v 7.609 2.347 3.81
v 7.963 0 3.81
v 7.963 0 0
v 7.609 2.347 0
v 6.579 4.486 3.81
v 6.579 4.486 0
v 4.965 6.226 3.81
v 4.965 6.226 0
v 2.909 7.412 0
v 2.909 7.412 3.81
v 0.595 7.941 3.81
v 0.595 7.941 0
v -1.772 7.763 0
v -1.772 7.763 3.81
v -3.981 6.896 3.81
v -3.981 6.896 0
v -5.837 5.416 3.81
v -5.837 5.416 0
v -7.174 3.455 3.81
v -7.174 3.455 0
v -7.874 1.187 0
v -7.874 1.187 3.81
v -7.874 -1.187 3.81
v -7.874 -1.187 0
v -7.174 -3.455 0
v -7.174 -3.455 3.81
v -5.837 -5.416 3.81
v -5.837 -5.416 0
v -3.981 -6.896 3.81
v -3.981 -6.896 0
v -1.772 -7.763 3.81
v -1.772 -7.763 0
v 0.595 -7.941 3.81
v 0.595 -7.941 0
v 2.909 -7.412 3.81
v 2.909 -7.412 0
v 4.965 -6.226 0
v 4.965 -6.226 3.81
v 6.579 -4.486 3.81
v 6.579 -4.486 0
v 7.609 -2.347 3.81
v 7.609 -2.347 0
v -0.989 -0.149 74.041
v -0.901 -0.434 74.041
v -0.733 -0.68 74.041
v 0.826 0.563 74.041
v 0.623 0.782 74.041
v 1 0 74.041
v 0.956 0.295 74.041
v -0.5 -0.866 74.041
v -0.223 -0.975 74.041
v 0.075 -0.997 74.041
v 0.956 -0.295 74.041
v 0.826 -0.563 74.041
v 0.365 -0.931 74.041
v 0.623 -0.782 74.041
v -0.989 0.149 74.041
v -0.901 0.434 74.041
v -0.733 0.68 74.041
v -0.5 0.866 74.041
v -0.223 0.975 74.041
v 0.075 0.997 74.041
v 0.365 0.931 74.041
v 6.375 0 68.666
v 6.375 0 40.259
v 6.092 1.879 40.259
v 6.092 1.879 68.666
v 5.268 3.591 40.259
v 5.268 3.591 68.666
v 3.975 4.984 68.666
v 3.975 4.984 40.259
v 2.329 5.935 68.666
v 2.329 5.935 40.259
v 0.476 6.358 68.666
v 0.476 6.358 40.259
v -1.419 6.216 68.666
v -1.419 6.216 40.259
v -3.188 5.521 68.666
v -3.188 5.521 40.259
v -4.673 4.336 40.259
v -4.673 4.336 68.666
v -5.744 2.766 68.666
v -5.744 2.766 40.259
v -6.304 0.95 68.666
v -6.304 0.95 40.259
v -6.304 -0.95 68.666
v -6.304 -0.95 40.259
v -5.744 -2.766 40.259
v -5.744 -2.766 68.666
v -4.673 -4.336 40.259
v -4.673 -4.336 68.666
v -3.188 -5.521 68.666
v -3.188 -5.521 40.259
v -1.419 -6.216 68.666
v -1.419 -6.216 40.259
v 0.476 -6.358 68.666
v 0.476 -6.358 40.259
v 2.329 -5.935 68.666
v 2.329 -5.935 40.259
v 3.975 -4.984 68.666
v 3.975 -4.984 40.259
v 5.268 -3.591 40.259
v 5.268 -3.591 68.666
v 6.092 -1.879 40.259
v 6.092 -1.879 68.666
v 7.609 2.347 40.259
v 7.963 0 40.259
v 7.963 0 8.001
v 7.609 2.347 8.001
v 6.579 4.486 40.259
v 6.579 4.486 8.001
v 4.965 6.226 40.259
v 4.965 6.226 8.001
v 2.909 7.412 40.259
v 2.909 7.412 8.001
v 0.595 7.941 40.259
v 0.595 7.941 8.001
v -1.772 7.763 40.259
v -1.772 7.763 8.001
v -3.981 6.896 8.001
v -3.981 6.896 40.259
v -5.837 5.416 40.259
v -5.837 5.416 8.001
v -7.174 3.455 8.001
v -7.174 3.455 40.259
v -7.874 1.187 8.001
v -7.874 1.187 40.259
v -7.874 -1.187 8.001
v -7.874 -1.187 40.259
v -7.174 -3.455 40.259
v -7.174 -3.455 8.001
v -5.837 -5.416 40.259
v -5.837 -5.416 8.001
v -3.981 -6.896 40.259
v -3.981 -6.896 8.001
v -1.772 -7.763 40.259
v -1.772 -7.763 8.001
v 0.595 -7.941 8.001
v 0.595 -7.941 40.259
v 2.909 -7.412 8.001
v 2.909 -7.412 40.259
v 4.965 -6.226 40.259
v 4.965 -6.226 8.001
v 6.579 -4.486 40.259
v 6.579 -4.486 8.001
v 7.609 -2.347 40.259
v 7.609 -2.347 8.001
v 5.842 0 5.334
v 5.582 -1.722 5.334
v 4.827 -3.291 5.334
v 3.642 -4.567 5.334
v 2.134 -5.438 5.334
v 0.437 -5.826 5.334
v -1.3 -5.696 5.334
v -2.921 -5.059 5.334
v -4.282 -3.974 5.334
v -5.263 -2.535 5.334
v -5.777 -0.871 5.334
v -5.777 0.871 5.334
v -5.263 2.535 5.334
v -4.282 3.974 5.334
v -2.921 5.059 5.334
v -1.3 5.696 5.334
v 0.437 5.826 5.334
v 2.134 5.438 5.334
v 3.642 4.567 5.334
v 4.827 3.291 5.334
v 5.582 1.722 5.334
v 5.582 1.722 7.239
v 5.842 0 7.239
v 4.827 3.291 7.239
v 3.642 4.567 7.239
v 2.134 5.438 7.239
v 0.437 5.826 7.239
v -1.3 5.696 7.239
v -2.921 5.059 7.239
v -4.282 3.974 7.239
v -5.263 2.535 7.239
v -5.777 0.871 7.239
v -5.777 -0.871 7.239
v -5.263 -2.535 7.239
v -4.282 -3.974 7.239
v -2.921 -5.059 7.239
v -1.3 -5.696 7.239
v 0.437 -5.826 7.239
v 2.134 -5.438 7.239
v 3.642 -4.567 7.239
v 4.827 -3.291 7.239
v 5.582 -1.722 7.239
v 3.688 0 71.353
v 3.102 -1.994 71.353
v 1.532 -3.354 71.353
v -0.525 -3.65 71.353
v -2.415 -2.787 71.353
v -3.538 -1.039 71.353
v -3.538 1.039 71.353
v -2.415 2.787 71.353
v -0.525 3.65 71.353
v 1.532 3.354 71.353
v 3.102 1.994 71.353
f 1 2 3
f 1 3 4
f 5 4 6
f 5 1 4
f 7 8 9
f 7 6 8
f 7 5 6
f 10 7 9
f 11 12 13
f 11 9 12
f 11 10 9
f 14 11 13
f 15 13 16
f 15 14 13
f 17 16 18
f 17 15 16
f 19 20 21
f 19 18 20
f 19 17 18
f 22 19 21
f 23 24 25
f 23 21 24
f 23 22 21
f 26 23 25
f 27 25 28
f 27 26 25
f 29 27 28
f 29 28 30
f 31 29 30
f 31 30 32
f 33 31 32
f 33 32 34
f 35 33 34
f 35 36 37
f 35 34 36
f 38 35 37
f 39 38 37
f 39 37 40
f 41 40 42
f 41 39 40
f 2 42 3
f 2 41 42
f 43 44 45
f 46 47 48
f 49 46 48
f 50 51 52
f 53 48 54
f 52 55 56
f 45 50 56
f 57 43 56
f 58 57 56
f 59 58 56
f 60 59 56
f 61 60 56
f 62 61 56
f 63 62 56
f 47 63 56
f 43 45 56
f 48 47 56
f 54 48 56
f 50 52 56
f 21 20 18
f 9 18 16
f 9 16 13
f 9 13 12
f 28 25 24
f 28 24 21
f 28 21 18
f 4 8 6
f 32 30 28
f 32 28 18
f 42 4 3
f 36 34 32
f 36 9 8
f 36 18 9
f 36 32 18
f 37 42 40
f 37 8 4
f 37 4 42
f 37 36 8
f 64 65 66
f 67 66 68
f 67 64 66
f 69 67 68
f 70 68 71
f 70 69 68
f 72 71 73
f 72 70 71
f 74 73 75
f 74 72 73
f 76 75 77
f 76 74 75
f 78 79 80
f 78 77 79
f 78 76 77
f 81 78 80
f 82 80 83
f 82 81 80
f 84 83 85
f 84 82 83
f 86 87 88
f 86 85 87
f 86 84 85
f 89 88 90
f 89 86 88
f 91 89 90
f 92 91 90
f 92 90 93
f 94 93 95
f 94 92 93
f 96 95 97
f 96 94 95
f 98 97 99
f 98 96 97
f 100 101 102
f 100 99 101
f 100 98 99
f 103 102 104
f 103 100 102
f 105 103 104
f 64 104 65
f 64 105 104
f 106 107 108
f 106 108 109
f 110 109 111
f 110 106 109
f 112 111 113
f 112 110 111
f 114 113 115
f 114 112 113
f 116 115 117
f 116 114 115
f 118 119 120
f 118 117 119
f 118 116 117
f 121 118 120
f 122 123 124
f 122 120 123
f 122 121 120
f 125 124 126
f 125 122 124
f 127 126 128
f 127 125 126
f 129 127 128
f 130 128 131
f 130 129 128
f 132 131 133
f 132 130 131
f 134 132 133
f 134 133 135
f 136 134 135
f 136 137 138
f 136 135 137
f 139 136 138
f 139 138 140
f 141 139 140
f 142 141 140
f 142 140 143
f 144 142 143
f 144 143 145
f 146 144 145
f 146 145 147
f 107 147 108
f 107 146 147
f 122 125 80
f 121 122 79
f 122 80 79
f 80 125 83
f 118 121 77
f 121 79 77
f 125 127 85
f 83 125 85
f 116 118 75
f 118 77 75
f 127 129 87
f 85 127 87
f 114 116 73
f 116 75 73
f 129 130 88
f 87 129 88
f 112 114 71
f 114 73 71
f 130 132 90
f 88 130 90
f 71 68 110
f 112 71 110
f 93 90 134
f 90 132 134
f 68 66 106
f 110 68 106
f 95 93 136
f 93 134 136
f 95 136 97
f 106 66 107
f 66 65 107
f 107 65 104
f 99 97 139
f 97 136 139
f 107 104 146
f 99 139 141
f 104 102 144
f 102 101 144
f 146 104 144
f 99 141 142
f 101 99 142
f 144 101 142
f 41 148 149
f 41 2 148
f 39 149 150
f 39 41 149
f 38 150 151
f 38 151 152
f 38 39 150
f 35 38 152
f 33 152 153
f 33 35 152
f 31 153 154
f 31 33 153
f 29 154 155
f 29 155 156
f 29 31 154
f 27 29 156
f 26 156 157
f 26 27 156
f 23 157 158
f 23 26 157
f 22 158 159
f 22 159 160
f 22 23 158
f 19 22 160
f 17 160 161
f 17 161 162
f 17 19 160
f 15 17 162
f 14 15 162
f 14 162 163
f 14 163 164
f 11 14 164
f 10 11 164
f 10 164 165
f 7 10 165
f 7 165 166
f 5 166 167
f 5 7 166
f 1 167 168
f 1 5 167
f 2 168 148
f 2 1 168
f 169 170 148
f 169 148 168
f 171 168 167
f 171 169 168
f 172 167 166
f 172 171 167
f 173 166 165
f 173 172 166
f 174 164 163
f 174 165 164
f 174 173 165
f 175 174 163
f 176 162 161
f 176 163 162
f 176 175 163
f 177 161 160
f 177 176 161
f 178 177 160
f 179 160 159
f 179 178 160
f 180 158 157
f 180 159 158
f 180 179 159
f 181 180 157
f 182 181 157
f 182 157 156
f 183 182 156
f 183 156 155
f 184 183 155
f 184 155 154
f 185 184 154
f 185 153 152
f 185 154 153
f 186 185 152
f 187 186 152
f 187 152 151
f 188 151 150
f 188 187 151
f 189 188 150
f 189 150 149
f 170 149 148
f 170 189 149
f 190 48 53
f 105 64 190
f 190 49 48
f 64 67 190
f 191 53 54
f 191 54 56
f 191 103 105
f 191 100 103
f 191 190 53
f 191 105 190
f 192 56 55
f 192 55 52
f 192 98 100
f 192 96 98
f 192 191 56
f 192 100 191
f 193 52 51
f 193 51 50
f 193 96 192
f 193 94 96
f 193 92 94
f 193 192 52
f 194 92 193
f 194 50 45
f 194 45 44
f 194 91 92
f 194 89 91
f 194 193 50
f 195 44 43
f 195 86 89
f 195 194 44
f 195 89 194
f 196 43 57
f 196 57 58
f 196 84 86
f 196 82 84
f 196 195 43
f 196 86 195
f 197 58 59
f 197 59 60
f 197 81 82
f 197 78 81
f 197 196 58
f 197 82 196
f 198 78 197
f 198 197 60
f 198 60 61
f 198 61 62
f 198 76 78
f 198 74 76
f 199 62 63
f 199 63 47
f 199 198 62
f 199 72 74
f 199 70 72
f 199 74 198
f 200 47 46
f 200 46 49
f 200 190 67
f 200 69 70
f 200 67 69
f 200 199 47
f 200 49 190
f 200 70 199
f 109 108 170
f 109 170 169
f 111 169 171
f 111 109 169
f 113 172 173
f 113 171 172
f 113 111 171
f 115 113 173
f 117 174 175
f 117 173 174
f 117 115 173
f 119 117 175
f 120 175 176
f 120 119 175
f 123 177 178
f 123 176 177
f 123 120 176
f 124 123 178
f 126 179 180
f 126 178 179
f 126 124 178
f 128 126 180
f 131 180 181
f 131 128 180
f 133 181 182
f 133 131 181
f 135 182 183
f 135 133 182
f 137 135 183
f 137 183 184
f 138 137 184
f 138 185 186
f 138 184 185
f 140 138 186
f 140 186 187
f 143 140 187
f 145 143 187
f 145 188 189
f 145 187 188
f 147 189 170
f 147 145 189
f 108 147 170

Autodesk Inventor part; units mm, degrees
ref_plane "YZ Plane" through (0, 0, 0) normal (1, 0, 0) x (0, 1, 0)
ref_plane "XZ Plane" through (0, 0, 0) normal (0, 1, 0) x (-1, 0, 0)
ref_plane "XY Plane" through (0, 0, 0) normal (0, 0, 1) x (1, 0, 0)
sketch "Sketch1" plane through (0, 0, 0) normal (0, 1, 0) x (-1, 0, 0)
  line L0 (0, 0) -> (-7.9629, 0)
  line L1 (-7.9629, 0) -> (-7.9629, 3.81)
  line L2 (-7.9629, 3.81) -> (-5.842, 5.334)
  line L3 (-5.842, 5.334) -> (-5.842, 7.239)
  line L4 (-5.842, 7.239) -> (-7.9629, 8.001)
  line L5 (-7.9629, 8.001) -> (-7.9629, 40.259)
  line L6 (-7.9629, 40.259) -> (-6.3754, 40.259)
  line L7 (-6.3754, 40.259) -> (-6.3754, 68.6656)
  line L8 (-6.3754, 68.6656) -> (-1, 74.041)
  line L9 (-1, 74.041) -> (0, 74.041)
  line L10 (0, 74.041) -> (0, 0)
  dimension "d1" = 3.81
  dimension "d3" = 74.041
  dimension "d4" = 32.258
  dimension "d5" = 0.762
  dimension "d6" = 1.524
  dimension "d7" = 4.191
  dimension "d8" = 5.842
  dimension "d9" = 7.9629
  dimension "d10" = 6.3754
  dimension "d11" = 45
  dimension "d12" = 1
revolve "Revolution1" add sketch "Sketch1" angle 360 about axis through (0, 0, 74.041) along (0, 0, -1)
properties part number "ubis"
